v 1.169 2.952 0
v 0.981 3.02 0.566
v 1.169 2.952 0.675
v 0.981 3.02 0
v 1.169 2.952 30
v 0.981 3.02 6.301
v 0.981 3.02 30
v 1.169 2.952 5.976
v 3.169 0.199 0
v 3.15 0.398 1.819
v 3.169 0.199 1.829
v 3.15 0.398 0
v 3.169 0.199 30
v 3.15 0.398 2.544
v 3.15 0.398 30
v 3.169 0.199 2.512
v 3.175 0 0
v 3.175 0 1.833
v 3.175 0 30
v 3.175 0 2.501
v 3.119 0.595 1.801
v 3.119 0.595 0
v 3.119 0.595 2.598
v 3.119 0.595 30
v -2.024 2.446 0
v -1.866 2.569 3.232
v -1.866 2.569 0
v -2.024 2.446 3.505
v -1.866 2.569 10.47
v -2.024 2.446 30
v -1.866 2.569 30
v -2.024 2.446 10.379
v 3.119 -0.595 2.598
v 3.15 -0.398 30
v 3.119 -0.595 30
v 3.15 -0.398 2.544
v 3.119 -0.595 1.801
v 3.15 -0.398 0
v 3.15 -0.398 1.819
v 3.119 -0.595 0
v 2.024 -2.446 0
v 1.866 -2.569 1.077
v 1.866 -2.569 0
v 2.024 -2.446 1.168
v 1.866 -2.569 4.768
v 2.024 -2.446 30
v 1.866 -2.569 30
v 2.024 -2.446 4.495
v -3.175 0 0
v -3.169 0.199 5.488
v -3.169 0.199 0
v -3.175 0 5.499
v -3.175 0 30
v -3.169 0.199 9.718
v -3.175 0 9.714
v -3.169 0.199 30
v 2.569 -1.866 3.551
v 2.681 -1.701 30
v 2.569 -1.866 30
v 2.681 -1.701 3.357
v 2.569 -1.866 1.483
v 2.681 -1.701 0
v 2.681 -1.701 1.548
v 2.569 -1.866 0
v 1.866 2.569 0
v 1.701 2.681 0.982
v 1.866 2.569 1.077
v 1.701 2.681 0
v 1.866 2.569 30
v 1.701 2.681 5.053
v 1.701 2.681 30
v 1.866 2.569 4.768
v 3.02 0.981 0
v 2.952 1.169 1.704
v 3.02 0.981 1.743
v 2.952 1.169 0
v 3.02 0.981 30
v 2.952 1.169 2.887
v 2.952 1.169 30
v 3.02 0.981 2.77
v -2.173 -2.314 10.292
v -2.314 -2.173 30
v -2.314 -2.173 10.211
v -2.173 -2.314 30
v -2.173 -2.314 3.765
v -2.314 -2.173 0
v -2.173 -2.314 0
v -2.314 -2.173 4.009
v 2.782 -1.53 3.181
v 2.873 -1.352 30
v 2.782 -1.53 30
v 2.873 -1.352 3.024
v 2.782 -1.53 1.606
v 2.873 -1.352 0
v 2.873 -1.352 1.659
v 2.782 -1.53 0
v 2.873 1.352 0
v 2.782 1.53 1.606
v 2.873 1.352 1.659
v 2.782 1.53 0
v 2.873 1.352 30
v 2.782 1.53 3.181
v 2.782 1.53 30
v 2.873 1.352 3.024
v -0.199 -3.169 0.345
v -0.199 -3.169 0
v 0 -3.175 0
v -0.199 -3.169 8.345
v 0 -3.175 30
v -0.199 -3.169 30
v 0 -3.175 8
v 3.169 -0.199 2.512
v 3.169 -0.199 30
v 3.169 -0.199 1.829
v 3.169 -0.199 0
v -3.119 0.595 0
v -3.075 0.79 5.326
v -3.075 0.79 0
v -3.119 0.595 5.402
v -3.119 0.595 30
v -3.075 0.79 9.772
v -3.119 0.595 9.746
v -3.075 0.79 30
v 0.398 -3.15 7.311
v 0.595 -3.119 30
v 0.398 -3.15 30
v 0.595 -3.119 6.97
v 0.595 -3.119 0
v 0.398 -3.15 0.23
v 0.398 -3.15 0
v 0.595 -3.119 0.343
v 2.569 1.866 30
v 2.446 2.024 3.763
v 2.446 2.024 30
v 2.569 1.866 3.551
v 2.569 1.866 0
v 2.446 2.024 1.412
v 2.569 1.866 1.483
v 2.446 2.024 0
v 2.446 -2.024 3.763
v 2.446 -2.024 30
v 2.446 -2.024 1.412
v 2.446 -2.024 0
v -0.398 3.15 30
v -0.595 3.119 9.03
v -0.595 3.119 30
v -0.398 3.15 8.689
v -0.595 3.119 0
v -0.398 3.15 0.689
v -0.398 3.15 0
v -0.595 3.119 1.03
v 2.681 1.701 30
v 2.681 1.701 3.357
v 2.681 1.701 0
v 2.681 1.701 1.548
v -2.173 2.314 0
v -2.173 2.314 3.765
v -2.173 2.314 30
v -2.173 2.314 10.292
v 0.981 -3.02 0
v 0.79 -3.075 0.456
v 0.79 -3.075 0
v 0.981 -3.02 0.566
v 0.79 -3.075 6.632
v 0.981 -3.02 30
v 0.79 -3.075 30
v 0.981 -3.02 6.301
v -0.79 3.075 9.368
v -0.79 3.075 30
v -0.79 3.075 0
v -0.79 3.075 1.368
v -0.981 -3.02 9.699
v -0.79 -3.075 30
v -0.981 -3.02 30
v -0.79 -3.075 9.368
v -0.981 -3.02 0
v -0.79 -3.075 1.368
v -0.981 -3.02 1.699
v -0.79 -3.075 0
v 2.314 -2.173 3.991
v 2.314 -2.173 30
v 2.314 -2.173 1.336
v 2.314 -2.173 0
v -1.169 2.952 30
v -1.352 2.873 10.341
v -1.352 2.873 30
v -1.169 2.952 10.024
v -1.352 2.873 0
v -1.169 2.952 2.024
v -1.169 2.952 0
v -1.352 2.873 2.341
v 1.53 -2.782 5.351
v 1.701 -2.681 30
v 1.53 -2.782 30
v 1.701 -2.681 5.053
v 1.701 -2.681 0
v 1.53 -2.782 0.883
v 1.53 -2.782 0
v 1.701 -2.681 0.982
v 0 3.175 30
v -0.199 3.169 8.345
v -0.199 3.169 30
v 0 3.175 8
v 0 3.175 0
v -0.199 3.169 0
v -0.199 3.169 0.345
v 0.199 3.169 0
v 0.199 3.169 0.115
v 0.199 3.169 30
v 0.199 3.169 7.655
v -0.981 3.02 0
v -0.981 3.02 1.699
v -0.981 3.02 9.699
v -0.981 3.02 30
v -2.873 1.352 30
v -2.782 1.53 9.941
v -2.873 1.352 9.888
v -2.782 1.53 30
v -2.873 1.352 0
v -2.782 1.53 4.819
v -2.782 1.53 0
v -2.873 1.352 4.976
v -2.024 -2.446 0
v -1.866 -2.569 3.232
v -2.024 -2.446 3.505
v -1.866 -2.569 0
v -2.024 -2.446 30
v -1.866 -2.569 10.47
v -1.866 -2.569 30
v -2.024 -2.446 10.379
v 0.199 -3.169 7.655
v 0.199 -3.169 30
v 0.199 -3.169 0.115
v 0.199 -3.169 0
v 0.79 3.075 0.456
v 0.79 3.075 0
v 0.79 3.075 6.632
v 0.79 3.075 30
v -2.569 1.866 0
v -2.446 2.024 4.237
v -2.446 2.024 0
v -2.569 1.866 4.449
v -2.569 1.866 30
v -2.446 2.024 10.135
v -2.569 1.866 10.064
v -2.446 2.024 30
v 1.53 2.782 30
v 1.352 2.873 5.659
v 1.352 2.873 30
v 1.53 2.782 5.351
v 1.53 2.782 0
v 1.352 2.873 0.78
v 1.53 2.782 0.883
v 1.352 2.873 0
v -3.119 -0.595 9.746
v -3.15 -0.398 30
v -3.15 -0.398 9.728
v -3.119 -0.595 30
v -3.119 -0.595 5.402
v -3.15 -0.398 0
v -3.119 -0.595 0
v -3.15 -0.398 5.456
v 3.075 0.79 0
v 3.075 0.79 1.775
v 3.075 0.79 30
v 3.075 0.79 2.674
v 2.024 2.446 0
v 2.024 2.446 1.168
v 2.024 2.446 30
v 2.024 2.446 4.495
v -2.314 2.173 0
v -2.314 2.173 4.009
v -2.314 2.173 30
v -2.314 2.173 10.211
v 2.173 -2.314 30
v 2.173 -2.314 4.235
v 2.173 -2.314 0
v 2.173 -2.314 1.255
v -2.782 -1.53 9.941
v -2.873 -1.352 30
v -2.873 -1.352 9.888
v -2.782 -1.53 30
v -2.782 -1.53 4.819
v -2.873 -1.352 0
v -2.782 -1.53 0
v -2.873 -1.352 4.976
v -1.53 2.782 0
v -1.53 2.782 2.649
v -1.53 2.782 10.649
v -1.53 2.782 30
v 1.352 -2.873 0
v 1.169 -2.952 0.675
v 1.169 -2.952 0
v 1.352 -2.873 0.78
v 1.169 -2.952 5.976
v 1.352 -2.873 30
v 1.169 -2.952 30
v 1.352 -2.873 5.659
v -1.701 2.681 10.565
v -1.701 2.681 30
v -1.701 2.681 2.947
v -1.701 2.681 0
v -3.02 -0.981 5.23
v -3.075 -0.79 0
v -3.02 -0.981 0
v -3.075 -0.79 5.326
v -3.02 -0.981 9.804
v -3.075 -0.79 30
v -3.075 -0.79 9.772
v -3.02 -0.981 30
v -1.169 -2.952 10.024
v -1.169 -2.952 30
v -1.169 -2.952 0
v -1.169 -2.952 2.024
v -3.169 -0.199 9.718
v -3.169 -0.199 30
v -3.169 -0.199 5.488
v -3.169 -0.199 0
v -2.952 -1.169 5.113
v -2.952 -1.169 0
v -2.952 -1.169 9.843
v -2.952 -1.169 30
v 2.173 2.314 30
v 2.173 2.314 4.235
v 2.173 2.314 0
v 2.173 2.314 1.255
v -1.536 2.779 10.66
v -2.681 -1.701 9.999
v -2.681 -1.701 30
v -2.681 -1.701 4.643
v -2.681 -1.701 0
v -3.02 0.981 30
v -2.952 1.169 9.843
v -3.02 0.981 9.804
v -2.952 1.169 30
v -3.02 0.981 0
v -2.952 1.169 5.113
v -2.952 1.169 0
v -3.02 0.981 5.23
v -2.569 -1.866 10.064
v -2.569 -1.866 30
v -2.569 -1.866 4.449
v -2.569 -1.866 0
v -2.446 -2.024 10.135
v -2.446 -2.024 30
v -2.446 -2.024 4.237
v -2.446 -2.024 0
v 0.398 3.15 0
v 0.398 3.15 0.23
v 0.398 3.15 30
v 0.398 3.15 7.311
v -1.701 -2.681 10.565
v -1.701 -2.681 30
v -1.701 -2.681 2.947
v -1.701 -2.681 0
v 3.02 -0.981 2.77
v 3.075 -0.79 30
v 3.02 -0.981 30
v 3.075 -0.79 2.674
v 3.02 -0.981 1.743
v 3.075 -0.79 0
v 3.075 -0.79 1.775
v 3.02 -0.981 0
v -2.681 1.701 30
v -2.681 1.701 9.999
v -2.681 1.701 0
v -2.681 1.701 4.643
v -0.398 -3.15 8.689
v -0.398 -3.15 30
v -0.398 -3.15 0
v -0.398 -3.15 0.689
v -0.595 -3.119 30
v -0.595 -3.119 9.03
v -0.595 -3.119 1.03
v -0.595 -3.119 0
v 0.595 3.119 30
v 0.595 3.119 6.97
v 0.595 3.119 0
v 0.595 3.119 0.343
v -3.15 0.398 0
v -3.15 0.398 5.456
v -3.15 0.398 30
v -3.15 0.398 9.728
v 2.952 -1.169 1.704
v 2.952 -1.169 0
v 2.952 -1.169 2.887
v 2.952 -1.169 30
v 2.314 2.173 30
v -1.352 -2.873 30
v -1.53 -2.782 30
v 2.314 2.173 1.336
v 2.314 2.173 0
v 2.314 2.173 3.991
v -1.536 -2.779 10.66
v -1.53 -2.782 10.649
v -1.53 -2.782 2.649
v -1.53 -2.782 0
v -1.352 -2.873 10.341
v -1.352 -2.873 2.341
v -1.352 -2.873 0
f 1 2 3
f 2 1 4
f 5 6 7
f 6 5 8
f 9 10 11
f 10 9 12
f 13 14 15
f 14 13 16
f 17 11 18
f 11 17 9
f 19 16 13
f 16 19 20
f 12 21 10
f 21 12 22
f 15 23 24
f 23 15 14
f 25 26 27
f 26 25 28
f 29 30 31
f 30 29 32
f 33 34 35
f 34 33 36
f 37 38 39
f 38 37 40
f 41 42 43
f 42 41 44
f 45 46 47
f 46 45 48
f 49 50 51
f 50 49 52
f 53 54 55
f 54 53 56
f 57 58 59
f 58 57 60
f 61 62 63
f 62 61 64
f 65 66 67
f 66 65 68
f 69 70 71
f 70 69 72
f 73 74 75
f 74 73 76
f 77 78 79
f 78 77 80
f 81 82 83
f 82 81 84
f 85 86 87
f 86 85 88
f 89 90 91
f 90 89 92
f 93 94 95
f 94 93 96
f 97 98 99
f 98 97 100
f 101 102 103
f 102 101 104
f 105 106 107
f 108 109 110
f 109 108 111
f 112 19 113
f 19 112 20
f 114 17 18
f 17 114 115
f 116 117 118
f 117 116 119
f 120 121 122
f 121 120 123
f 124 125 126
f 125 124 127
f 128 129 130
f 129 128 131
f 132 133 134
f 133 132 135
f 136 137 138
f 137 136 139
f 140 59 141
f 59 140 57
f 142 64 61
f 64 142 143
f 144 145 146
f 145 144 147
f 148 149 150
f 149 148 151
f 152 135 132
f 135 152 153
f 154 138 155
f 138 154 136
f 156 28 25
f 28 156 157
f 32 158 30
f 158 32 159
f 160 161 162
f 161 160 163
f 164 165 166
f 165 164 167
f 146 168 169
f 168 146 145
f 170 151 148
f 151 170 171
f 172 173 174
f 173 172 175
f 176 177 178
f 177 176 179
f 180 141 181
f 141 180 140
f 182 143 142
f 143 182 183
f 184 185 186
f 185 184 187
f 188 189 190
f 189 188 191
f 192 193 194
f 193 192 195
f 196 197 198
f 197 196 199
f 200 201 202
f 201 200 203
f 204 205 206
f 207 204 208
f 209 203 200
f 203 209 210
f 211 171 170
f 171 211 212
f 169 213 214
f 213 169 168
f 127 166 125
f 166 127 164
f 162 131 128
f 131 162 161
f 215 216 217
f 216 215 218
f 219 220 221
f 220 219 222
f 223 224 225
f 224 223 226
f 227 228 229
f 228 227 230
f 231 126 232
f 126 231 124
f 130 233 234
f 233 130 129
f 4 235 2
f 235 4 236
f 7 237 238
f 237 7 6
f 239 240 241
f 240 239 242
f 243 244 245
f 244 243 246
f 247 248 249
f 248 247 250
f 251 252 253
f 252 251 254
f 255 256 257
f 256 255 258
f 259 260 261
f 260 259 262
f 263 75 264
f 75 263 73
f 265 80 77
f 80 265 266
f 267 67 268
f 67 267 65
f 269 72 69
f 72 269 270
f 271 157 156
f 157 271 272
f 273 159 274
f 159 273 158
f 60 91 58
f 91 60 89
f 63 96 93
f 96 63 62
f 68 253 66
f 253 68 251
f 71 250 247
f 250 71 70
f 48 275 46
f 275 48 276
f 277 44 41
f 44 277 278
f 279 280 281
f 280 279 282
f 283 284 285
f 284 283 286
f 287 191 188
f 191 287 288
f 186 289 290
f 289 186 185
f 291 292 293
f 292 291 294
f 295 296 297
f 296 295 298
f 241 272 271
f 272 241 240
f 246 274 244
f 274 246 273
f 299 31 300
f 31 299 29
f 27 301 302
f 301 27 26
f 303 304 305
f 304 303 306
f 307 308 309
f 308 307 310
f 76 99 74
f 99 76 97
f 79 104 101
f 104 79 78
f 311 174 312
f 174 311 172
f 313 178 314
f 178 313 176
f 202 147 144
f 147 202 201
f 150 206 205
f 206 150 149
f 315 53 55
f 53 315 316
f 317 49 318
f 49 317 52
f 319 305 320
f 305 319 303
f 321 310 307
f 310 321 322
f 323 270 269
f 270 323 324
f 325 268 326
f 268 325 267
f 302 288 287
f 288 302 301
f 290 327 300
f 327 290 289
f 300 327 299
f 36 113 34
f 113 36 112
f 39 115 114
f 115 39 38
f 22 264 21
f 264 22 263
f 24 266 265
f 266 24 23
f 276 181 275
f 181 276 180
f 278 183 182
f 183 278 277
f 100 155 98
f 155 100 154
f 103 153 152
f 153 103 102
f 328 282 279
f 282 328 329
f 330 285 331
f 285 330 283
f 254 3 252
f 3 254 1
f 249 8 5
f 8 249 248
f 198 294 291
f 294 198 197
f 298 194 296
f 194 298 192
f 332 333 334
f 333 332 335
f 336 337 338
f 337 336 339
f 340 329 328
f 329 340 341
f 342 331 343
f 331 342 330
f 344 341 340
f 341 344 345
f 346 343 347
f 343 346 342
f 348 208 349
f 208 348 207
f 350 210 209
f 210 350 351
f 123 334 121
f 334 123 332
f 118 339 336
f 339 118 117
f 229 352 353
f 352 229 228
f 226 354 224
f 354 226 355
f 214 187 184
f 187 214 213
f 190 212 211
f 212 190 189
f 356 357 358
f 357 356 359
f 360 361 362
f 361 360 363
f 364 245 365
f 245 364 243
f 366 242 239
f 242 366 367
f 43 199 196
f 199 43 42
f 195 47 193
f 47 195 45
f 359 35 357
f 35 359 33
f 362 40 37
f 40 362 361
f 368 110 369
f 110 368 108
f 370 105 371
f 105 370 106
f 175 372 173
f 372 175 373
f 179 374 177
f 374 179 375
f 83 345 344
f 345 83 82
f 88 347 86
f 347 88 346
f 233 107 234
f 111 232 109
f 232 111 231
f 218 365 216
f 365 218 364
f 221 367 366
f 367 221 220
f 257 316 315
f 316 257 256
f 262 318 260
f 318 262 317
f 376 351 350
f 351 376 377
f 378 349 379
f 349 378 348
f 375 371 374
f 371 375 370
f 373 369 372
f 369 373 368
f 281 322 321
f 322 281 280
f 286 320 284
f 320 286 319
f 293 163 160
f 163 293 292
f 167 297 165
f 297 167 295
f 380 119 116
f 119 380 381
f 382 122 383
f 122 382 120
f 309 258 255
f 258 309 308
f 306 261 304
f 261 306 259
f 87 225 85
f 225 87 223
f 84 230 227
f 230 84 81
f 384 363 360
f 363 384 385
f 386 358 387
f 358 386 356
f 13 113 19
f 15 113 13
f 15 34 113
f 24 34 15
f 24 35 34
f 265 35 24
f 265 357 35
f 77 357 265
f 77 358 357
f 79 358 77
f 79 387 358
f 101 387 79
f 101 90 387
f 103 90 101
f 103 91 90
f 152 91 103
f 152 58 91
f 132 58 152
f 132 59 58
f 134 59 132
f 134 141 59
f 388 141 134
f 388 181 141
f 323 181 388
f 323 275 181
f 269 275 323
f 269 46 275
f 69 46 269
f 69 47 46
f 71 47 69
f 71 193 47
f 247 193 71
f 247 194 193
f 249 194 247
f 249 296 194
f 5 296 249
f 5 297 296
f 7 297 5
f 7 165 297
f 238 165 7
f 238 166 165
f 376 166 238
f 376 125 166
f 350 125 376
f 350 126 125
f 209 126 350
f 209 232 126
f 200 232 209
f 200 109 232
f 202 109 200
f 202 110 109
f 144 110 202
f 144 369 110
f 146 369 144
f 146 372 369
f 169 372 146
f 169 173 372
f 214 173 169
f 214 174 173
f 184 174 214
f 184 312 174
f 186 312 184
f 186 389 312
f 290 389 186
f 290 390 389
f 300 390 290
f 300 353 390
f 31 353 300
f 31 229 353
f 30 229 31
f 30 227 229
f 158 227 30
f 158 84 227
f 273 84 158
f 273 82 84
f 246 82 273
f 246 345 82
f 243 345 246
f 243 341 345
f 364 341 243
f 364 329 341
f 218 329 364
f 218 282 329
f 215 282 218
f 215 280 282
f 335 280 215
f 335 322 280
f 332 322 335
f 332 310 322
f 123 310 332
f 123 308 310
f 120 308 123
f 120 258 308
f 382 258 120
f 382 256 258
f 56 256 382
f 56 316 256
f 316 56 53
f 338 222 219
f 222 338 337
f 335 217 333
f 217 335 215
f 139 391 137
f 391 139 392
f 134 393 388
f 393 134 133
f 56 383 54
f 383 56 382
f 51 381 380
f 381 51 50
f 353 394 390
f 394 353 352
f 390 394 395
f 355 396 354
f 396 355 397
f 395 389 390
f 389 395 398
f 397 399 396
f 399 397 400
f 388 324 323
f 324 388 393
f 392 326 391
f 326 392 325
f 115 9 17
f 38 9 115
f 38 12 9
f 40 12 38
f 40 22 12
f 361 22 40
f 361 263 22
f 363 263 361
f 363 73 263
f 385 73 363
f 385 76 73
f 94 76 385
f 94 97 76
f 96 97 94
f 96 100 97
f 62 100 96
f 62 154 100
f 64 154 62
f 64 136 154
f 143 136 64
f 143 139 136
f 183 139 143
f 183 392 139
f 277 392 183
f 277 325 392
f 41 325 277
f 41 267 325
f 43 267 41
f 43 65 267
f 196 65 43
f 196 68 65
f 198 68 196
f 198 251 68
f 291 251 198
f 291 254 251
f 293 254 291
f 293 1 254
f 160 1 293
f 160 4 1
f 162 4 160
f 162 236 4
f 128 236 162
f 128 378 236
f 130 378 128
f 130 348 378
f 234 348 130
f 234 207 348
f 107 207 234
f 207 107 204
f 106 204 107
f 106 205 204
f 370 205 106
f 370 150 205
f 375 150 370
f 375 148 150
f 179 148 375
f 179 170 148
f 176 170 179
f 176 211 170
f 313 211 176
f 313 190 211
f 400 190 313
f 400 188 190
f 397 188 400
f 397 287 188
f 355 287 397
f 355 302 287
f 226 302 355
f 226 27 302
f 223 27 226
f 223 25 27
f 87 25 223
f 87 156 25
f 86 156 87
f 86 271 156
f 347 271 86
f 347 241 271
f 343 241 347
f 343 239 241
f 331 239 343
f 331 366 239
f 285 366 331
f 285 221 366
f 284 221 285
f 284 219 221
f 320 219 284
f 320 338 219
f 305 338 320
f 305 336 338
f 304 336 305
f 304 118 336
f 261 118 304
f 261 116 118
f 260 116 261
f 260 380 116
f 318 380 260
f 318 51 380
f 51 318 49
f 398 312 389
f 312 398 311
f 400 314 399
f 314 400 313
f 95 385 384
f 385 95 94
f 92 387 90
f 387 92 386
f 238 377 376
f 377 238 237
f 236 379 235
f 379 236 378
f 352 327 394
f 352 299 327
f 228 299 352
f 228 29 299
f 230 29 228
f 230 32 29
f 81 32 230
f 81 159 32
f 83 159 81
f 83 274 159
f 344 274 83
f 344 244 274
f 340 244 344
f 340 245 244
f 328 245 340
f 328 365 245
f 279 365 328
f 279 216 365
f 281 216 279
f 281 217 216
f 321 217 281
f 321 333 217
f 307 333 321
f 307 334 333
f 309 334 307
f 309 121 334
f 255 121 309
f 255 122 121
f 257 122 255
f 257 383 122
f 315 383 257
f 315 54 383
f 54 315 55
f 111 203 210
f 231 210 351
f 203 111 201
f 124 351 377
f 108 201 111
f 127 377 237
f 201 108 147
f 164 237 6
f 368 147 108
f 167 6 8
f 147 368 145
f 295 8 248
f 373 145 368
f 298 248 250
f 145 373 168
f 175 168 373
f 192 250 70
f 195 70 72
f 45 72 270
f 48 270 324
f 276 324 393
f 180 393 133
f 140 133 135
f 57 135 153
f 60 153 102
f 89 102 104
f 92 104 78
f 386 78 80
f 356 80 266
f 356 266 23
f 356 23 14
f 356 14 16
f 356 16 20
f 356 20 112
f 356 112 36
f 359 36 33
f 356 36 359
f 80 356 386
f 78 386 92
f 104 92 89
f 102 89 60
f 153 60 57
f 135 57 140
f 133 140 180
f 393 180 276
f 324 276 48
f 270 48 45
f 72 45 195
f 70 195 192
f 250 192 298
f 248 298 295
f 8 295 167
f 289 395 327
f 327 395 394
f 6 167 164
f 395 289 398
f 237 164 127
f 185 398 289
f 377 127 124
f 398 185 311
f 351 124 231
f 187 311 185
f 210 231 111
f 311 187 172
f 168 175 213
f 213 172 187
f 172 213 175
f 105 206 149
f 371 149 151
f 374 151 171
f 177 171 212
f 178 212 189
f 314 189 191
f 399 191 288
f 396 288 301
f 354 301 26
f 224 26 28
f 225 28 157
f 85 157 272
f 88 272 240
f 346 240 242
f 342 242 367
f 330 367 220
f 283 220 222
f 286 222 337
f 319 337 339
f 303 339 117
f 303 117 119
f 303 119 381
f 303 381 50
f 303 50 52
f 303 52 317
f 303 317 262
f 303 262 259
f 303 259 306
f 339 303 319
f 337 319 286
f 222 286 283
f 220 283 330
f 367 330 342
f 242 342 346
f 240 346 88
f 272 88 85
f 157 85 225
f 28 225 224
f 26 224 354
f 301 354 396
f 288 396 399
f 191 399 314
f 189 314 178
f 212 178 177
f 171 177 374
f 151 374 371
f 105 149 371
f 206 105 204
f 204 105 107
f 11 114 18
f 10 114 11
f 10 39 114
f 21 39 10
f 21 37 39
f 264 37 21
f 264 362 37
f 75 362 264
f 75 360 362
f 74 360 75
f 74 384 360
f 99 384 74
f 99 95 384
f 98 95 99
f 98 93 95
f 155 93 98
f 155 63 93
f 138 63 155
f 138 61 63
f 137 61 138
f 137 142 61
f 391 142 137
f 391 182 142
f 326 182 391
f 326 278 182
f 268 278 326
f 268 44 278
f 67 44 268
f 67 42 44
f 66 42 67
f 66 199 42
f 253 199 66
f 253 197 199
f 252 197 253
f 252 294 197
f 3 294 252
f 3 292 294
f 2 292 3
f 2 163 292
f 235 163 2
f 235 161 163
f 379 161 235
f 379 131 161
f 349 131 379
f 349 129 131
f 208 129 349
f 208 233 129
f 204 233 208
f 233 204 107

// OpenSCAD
//NEUROPIXELS DOVETAIL HOLDER
// From Spec-sheet provided on the HHMI/Janelia Website
// To-Scale
// Conmverted from inches to mm 
// 1" = 25.4 mm
// 0.5" = 12.7 mm 
// 0.25" = 6.35 mm 

module post(){
    module main(){
        translate([0,0,0]){
            rotate([0,0,0]){
                cylinder($fn=100, d=6.35, h=30);
            }}
        }
    module neg(){
        translate([0,-4,0]){
            rotate([0,-30,0]){
                #cube([4,8,10]);
            }}
        }
    difference(){
        main();
        neg();
    }
}

post();
